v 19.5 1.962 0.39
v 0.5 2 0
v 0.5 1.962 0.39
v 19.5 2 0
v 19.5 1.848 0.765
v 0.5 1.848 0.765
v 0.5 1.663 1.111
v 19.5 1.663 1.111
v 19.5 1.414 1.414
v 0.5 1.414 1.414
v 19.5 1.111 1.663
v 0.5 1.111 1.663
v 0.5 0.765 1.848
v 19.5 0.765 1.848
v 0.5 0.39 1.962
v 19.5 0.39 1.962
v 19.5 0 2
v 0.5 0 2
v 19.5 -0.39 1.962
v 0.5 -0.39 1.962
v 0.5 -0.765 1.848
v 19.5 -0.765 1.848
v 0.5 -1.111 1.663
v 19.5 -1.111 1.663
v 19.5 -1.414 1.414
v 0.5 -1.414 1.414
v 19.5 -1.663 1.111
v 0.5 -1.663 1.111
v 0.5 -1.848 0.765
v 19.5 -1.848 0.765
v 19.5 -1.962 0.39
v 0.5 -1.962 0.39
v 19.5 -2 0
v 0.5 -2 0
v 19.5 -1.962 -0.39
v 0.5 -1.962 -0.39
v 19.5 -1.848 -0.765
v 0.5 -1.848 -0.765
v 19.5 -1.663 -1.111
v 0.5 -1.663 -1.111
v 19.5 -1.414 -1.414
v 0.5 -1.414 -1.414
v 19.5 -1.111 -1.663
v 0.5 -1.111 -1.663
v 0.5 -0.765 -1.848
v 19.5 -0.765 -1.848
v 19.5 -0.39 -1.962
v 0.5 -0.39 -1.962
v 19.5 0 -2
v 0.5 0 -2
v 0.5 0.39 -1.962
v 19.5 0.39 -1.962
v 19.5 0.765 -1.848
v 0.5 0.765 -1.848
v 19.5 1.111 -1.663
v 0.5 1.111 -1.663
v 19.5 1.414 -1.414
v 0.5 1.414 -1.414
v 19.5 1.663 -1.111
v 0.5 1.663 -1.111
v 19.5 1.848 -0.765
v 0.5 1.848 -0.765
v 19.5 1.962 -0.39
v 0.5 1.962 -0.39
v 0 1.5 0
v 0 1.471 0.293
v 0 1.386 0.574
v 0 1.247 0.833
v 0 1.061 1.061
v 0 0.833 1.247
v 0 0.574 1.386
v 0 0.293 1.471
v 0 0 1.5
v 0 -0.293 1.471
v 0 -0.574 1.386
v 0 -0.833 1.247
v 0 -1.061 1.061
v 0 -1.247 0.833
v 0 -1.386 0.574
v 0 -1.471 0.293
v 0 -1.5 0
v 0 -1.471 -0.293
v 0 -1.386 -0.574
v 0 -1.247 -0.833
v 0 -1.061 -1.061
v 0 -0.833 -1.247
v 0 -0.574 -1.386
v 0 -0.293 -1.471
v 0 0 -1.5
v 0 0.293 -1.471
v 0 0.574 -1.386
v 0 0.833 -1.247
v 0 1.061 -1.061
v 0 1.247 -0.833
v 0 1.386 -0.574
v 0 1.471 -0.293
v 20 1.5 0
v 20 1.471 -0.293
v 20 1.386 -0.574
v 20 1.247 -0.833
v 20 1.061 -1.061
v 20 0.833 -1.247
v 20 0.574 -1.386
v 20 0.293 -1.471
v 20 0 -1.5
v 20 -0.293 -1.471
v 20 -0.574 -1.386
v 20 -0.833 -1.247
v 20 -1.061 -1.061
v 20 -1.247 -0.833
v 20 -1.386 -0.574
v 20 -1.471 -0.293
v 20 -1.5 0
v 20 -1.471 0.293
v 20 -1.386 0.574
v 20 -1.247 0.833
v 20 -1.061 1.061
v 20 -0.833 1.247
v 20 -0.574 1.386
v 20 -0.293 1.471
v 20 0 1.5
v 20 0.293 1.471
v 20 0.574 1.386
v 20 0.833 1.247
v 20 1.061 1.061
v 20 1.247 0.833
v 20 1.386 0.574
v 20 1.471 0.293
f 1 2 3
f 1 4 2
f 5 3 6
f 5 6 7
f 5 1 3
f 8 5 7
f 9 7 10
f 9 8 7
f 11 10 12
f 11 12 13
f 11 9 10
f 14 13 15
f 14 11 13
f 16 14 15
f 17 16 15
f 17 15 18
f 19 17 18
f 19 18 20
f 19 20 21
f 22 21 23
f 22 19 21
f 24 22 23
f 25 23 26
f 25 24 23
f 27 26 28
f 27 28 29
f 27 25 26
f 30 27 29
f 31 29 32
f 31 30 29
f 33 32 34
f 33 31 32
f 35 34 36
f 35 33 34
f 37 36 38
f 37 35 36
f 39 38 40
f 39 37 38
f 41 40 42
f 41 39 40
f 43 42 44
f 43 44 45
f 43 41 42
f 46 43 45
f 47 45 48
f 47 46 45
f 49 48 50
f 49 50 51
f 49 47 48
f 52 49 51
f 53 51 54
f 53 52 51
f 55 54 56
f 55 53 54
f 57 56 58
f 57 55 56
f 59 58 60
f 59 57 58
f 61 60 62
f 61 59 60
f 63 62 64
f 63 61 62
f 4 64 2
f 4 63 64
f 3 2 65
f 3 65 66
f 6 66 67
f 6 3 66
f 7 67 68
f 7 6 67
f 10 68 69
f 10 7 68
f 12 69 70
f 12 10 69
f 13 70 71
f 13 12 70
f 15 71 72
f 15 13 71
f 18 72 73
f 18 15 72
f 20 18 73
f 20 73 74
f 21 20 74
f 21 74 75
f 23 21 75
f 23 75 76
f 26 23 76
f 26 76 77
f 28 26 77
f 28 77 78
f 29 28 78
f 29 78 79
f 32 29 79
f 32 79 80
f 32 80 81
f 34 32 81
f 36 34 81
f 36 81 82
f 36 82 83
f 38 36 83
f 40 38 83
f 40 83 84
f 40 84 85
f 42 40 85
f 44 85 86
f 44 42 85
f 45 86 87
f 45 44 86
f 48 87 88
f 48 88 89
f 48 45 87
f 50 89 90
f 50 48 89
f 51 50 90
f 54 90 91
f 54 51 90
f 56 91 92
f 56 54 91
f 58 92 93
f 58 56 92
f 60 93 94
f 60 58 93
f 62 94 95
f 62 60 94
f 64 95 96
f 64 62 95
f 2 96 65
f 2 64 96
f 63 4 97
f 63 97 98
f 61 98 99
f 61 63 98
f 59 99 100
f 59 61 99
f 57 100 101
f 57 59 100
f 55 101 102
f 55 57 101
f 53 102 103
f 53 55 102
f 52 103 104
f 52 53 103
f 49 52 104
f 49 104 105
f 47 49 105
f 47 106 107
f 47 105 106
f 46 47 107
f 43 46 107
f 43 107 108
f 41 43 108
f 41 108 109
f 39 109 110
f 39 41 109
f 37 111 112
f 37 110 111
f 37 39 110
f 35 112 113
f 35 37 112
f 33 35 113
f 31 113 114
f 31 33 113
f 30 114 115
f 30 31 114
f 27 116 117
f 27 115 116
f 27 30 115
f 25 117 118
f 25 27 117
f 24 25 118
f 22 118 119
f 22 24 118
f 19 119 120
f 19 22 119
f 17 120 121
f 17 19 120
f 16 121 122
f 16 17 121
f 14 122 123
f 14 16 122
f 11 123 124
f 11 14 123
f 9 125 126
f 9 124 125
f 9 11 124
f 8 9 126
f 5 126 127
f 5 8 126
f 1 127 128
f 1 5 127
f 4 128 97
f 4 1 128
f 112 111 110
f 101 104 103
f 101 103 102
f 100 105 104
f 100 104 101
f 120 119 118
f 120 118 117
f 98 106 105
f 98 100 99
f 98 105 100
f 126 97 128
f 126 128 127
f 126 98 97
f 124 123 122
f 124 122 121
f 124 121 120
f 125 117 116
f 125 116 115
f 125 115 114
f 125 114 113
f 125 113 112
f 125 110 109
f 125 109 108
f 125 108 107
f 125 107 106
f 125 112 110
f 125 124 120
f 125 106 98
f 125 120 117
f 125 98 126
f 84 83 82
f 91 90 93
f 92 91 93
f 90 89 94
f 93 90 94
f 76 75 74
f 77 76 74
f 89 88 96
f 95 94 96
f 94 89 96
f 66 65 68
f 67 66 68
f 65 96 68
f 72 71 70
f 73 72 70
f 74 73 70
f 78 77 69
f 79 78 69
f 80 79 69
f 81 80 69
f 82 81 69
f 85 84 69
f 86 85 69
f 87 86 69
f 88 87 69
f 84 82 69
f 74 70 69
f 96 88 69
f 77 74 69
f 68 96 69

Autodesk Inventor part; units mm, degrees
ref_plane "Start Plane" through (0, 0, 0) normal (1, 0, 0) x (0, 1, 0)
ref_plane "XZ Plane" through (0, 0, 0) normal (0, 1, 0) x (-1, 0, 0)
ref_plane "XY Plane" through (0, 0, 0) normal (0, 0, 1) x (1, 0, 0)
sketch "Main Sketch" plane through (0, 0, 0) normal (0, 0, 1) x (1, 0, 0)
  line L0 (0, 0) -> (20, 0)
  line L1 (0, 0) -> (0, 2)
  line L2 (20, 2) -> (20, 0)
  line L3 (0, 2) -> (20, 2)
  dimension "d3" = 4
revolve "Revolution1" add sketch "Main Sketch" angle 360 about axis through (0, 0, 0) along (1, 0, 0)
chamfer "Chamfer1" distance 0.5 angle 45 1 edges at (0, -2, 0) measured on face at (13.3333, 1.9741, -0.3208)
chamfer "Chamfer2" distance 0.5 angle 45 1 edges at (20, -2, 0) measured on face at (13.5, 1.9935, -0.1609)
properties part number "Eje motor - Interno" material "Steel"
